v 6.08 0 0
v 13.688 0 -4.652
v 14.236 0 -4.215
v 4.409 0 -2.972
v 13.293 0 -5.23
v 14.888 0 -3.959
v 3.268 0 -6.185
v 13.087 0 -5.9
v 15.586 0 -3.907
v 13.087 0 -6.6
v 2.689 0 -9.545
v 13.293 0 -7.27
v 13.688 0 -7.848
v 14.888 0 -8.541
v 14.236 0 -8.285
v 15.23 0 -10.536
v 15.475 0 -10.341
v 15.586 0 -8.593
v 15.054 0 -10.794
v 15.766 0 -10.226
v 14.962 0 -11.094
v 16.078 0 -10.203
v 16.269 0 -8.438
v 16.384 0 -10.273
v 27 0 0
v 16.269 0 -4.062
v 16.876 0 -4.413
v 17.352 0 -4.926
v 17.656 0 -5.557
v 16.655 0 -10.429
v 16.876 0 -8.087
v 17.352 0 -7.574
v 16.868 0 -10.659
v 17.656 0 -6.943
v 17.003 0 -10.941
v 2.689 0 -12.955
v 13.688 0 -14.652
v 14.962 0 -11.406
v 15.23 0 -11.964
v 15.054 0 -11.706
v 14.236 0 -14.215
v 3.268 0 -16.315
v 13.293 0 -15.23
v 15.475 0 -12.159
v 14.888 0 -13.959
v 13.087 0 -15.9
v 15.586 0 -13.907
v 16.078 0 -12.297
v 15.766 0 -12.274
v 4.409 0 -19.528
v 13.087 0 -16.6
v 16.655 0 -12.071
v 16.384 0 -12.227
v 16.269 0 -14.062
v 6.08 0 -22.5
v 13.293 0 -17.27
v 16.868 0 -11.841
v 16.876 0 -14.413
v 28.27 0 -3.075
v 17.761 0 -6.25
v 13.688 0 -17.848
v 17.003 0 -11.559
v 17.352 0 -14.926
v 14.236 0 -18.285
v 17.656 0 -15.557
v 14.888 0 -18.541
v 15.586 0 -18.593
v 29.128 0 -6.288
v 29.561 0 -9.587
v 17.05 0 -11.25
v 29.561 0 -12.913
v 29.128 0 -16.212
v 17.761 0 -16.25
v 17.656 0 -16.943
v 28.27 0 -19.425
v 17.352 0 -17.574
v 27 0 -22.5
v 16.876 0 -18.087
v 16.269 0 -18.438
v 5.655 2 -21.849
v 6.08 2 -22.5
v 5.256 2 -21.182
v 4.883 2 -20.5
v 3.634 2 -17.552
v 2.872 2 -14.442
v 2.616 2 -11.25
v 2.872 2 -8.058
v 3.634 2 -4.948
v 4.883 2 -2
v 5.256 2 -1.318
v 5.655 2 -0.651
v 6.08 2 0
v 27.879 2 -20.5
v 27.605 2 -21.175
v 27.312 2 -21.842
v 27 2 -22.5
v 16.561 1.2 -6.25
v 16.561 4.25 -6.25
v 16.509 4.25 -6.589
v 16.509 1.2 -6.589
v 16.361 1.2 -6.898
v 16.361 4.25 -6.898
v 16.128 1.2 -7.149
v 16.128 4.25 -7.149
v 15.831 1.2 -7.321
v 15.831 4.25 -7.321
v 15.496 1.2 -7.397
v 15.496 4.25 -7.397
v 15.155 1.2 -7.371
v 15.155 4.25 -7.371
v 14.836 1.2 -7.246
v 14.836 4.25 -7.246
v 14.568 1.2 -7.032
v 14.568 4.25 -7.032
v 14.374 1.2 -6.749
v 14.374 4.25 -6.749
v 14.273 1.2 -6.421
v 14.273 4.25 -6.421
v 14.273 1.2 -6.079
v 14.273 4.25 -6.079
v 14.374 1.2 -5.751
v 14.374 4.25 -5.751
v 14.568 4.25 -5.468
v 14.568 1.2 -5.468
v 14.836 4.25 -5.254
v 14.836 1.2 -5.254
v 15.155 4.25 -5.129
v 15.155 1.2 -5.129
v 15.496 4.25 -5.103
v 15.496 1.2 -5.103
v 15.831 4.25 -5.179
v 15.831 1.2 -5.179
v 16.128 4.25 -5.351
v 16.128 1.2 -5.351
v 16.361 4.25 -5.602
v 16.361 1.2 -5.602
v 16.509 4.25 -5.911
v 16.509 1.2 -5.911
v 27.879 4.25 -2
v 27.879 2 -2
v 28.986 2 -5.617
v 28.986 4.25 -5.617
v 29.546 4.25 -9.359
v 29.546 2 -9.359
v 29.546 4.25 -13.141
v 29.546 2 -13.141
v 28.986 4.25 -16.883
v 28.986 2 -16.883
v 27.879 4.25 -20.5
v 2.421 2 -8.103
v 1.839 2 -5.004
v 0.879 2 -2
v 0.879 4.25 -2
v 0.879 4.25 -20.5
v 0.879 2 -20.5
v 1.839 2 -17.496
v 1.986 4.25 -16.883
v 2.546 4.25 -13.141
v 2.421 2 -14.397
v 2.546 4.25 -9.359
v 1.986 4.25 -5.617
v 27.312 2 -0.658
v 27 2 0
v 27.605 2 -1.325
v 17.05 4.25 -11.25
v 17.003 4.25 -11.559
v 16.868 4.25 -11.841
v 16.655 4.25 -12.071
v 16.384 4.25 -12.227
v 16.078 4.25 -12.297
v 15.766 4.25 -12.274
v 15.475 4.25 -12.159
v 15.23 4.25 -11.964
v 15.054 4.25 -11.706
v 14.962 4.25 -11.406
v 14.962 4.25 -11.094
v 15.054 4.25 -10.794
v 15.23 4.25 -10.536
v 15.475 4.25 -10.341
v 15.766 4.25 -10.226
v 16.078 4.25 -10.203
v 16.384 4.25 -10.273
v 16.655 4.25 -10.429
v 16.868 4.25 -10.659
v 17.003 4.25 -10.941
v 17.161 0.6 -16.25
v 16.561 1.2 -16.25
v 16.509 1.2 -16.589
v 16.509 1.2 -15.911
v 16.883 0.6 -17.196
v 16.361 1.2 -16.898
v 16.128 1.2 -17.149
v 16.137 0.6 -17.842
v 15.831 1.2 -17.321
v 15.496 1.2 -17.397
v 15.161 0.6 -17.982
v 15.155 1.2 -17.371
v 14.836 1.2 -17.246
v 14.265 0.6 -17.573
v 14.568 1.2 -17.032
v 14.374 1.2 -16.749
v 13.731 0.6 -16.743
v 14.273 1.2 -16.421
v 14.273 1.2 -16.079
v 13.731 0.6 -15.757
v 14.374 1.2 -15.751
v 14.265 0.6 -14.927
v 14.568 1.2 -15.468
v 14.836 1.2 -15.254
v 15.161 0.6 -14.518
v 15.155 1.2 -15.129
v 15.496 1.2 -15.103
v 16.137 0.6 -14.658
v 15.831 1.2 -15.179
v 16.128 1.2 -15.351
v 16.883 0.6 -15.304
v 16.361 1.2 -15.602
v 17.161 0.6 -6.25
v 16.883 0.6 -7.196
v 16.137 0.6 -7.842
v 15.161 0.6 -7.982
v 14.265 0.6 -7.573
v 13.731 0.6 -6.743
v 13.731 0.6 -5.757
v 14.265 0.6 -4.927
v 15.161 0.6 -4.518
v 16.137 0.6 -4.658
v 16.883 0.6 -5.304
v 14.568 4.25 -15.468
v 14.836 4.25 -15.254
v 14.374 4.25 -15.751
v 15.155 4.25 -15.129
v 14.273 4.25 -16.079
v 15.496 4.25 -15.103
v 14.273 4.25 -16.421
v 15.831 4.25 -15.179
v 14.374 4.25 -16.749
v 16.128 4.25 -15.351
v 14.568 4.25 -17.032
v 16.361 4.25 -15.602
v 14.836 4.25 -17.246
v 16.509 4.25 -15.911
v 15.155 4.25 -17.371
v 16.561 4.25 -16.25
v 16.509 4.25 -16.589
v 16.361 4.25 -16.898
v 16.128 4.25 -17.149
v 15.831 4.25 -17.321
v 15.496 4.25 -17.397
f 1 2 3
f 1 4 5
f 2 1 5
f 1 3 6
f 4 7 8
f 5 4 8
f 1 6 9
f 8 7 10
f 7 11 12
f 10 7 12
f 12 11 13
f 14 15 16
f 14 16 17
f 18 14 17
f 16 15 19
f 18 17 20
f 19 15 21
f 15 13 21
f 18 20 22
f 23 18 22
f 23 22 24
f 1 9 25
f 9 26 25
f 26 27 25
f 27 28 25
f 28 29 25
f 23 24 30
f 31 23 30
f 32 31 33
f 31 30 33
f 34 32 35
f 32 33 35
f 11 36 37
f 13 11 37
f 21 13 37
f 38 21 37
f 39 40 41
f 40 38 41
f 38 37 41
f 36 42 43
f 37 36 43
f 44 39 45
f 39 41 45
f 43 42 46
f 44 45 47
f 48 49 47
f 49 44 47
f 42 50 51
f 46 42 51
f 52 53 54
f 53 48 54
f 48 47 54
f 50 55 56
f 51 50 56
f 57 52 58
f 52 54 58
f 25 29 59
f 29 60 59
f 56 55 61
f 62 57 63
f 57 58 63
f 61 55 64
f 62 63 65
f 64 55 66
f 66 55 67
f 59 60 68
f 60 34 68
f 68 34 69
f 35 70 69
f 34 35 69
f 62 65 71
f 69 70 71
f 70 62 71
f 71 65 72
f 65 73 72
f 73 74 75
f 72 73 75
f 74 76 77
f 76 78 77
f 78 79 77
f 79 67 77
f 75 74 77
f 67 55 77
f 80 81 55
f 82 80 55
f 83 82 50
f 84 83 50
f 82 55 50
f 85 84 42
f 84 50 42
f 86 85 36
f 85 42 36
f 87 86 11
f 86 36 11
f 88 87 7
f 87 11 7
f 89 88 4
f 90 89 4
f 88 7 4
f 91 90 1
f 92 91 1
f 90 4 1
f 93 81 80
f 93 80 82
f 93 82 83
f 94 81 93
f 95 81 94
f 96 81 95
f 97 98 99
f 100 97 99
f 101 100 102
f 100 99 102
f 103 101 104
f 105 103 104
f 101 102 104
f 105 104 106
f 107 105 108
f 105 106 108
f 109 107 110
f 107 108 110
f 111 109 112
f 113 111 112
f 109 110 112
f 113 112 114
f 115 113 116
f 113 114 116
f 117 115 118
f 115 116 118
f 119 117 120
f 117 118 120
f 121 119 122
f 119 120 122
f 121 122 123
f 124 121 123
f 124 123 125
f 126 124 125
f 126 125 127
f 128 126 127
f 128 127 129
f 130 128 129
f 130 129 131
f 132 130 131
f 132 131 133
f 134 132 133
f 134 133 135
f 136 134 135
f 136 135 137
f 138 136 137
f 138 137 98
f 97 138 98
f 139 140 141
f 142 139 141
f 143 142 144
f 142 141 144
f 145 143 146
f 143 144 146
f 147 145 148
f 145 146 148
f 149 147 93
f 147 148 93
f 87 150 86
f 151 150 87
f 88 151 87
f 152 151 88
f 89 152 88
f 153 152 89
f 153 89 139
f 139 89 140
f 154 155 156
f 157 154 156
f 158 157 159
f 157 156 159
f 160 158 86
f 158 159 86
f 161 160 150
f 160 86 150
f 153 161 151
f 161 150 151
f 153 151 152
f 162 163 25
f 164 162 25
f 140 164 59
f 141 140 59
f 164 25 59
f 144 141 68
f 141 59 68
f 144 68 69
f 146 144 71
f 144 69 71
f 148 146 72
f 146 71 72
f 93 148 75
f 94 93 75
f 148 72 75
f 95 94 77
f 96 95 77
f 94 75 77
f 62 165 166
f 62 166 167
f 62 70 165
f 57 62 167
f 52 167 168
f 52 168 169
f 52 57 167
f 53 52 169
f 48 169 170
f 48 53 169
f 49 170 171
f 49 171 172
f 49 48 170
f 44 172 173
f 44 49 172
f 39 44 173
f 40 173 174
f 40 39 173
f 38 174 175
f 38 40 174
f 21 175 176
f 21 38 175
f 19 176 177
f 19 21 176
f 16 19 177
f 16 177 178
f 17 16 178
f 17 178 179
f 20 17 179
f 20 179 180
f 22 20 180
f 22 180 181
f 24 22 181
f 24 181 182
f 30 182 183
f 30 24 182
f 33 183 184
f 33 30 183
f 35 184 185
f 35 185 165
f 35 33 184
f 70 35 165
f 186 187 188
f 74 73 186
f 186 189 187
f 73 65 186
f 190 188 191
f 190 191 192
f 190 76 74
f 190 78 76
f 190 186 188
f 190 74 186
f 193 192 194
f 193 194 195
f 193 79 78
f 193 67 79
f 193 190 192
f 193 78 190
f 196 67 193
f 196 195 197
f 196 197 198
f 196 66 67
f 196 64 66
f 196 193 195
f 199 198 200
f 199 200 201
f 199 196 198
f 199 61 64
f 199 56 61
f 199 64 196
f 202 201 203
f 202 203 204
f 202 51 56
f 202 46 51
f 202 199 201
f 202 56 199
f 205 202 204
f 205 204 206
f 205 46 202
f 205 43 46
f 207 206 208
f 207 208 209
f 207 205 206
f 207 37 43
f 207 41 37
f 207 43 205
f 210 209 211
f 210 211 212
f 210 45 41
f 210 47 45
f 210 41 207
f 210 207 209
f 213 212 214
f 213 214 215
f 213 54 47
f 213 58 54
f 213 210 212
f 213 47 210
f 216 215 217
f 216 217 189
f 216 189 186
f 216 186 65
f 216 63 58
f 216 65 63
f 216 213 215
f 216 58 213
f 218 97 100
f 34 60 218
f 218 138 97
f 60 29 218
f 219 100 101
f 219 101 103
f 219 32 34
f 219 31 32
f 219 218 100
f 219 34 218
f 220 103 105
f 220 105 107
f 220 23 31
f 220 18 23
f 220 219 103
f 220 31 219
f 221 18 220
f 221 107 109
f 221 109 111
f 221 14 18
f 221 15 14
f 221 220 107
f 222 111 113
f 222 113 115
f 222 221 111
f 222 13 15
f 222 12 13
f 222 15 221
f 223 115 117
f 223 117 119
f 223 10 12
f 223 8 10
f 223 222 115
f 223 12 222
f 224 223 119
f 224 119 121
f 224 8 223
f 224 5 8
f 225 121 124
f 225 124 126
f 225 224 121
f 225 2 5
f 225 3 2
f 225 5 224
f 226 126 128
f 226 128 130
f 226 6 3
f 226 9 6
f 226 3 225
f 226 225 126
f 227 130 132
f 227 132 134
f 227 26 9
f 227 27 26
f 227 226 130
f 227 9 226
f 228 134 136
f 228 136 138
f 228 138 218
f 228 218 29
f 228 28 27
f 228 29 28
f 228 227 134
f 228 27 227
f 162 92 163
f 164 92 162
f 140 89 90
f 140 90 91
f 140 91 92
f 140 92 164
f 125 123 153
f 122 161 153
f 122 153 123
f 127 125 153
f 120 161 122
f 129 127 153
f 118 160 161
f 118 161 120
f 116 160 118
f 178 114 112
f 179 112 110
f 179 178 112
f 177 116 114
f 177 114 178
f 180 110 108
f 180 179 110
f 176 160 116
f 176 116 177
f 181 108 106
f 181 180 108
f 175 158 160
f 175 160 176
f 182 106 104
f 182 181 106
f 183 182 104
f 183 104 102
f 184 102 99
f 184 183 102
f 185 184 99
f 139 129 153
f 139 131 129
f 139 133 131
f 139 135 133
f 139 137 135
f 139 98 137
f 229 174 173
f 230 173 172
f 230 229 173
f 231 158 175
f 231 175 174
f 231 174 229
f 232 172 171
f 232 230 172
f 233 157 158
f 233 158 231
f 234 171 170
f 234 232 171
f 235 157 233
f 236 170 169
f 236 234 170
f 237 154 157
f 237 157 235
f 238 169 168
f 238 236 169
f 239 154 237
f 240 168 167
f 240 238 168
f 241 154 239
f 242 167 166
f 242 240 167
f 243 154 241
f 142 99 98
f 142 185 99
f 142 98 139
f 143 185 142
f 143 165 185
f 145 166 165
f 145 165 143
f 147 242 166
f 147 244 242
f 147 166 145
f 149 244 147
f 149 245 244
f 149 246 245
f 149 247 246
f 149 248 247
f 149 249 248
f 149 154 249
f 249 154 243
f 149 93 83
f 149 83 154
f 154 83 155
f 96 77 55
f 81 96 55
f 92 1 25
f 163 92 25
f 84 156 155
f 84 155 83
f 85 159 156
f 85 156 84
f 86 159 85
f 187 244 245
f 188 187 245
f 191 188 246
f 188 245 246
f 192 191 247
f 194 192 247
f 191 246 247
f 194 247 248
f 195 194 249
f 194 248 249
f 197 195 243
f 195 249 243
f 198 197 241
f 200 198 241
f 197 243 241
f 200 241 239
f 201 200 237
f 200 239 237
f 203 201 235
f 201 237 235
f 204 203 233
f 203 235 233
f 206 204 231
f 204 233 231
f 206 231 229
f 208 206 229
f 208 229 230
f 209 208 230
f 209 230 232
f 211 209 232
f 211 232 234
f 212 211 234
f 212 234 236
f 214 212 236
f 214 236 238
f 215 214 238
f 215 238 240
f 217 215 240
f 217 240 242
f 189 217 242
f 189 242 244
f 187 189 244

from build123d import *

# Parameters (mm, degrees)
SKETCH_1_R          = 1.05
EXTRUDE_1_DEPTH     = 2
EXTRUDE_START       = 2
SKETCH_1_3_R        = 1.05
EXTRUDE_2_DEPTH     = 2.25
CUT_EXTRUDE_1_DEPTH = 2
SKETCH_3_R          = 1.15
CUT_EXTRUDE_2_DEPTH = 5.25
CHAMFER_1_SIZE      = 1.2


with BuildPart() as part:
    # Эскиз1 → Бобышка-Вытянуть1 (new body)
    with BuildSketch(Plane(origin=(0, 0, 0), x_dir=(1, 0, 0), z_dir=(0, 1, 0))):
        with BuildLine():
            Line((0.878934798, 22.5), (0.878934798, 20.5))
            ThreePointArc((0.878934798, 20.5), (2.615780546, 11.25), (0.878934798, 2))
            Line((0.878934798, 2), (0.878934798, 0))
            Line((0.878934798, 0), (27, 0))
            ThreePointArc((27, 0), (29.615780546, 11.25), (27, 22.5))
            Line((27, 22.5), (0.878934798, 22.5))
        make_face()
        with Locations((16, 11.25)):
            Circle(SKETCH_1_R, mode=Mode.SUBTRACT)
    extrude(amount=EXTRUDE_1_DEPTH)

    # Эскиз1<3> → Бобышка-Вытянуть2 (add)
    with BuildSketch(Plane(origin=(0, 0, 0), x_dir=(1, 0, 0), z_dir=(0, 1, 0)).offset(EXTRUDE_START)):
        with BuildLine():
            Line((27.878934798, 20.5), (0.878934798, 20.5))
            ThreePointArc((0.878934798, 20.5), (2.615780546, 11.25), (0.878934798, 2))
            Line((0.878934798, 2), (27.878934798, 2))
            ThreePointArc((27.878934798, 2), (29.615780546, 11.25), (27.878934798, 20.5))
        make_face()
        with Locations((16, 11.25)):
            Circle(SKETCH_1_3_R, mode=Mode.SUBTRACT)
    extrude(amount=EXTRUDE_2_DEPTH)

    # Эскиз2 → Вырез-Вытянуть1 (cut)
    with BuildSketch(Plane.XZ):
        with BuildLine():
            Line((6.079834852, 0), (0.878934798, 0))
            Line((0.878934798, 0), (0.878934798, -22.5))
            Line((0.878934798, -22.5), (6.079834852, -22.5))
            ThreePointArc((6.079834852, -22.5), (2.615780546, -11.25), (6.079834852, 0))
        make_face()
    extrude(amount=-CUT_EXTRUDE_1_DEPTH, mode=Mode.SUBTRACT)

    # Эскиз3 → Вырез-Вытянуть2 (cut, through all)
    with BuildSketch(Plane(origin=(0, 4.25, 0), x_dir=(1, 0, 0), z_dir=(0, 1, 0))):
        with Locations((15.410523666, 6.25)):
            Circle(SKETCH_3_R)
        with Locations((15.410523666, 16.25)):
            Circle(SKETCH_3_R)
    extrude(amount=-CUT_EXTRUDE_2_DEPTH, mode=Mode.SUBTRACT)

    # Фаска1
    chamfer_1_edges = [part.edges().sort_by_distance(p)[0] for p in [
        (14.260523666, 0, -16.25),
        (14.260523666, 0, -6.25),
    ]]
    chamfer(chamfer_1_edges, length=CHAMFER_1_SIZE)


solid = part.part
